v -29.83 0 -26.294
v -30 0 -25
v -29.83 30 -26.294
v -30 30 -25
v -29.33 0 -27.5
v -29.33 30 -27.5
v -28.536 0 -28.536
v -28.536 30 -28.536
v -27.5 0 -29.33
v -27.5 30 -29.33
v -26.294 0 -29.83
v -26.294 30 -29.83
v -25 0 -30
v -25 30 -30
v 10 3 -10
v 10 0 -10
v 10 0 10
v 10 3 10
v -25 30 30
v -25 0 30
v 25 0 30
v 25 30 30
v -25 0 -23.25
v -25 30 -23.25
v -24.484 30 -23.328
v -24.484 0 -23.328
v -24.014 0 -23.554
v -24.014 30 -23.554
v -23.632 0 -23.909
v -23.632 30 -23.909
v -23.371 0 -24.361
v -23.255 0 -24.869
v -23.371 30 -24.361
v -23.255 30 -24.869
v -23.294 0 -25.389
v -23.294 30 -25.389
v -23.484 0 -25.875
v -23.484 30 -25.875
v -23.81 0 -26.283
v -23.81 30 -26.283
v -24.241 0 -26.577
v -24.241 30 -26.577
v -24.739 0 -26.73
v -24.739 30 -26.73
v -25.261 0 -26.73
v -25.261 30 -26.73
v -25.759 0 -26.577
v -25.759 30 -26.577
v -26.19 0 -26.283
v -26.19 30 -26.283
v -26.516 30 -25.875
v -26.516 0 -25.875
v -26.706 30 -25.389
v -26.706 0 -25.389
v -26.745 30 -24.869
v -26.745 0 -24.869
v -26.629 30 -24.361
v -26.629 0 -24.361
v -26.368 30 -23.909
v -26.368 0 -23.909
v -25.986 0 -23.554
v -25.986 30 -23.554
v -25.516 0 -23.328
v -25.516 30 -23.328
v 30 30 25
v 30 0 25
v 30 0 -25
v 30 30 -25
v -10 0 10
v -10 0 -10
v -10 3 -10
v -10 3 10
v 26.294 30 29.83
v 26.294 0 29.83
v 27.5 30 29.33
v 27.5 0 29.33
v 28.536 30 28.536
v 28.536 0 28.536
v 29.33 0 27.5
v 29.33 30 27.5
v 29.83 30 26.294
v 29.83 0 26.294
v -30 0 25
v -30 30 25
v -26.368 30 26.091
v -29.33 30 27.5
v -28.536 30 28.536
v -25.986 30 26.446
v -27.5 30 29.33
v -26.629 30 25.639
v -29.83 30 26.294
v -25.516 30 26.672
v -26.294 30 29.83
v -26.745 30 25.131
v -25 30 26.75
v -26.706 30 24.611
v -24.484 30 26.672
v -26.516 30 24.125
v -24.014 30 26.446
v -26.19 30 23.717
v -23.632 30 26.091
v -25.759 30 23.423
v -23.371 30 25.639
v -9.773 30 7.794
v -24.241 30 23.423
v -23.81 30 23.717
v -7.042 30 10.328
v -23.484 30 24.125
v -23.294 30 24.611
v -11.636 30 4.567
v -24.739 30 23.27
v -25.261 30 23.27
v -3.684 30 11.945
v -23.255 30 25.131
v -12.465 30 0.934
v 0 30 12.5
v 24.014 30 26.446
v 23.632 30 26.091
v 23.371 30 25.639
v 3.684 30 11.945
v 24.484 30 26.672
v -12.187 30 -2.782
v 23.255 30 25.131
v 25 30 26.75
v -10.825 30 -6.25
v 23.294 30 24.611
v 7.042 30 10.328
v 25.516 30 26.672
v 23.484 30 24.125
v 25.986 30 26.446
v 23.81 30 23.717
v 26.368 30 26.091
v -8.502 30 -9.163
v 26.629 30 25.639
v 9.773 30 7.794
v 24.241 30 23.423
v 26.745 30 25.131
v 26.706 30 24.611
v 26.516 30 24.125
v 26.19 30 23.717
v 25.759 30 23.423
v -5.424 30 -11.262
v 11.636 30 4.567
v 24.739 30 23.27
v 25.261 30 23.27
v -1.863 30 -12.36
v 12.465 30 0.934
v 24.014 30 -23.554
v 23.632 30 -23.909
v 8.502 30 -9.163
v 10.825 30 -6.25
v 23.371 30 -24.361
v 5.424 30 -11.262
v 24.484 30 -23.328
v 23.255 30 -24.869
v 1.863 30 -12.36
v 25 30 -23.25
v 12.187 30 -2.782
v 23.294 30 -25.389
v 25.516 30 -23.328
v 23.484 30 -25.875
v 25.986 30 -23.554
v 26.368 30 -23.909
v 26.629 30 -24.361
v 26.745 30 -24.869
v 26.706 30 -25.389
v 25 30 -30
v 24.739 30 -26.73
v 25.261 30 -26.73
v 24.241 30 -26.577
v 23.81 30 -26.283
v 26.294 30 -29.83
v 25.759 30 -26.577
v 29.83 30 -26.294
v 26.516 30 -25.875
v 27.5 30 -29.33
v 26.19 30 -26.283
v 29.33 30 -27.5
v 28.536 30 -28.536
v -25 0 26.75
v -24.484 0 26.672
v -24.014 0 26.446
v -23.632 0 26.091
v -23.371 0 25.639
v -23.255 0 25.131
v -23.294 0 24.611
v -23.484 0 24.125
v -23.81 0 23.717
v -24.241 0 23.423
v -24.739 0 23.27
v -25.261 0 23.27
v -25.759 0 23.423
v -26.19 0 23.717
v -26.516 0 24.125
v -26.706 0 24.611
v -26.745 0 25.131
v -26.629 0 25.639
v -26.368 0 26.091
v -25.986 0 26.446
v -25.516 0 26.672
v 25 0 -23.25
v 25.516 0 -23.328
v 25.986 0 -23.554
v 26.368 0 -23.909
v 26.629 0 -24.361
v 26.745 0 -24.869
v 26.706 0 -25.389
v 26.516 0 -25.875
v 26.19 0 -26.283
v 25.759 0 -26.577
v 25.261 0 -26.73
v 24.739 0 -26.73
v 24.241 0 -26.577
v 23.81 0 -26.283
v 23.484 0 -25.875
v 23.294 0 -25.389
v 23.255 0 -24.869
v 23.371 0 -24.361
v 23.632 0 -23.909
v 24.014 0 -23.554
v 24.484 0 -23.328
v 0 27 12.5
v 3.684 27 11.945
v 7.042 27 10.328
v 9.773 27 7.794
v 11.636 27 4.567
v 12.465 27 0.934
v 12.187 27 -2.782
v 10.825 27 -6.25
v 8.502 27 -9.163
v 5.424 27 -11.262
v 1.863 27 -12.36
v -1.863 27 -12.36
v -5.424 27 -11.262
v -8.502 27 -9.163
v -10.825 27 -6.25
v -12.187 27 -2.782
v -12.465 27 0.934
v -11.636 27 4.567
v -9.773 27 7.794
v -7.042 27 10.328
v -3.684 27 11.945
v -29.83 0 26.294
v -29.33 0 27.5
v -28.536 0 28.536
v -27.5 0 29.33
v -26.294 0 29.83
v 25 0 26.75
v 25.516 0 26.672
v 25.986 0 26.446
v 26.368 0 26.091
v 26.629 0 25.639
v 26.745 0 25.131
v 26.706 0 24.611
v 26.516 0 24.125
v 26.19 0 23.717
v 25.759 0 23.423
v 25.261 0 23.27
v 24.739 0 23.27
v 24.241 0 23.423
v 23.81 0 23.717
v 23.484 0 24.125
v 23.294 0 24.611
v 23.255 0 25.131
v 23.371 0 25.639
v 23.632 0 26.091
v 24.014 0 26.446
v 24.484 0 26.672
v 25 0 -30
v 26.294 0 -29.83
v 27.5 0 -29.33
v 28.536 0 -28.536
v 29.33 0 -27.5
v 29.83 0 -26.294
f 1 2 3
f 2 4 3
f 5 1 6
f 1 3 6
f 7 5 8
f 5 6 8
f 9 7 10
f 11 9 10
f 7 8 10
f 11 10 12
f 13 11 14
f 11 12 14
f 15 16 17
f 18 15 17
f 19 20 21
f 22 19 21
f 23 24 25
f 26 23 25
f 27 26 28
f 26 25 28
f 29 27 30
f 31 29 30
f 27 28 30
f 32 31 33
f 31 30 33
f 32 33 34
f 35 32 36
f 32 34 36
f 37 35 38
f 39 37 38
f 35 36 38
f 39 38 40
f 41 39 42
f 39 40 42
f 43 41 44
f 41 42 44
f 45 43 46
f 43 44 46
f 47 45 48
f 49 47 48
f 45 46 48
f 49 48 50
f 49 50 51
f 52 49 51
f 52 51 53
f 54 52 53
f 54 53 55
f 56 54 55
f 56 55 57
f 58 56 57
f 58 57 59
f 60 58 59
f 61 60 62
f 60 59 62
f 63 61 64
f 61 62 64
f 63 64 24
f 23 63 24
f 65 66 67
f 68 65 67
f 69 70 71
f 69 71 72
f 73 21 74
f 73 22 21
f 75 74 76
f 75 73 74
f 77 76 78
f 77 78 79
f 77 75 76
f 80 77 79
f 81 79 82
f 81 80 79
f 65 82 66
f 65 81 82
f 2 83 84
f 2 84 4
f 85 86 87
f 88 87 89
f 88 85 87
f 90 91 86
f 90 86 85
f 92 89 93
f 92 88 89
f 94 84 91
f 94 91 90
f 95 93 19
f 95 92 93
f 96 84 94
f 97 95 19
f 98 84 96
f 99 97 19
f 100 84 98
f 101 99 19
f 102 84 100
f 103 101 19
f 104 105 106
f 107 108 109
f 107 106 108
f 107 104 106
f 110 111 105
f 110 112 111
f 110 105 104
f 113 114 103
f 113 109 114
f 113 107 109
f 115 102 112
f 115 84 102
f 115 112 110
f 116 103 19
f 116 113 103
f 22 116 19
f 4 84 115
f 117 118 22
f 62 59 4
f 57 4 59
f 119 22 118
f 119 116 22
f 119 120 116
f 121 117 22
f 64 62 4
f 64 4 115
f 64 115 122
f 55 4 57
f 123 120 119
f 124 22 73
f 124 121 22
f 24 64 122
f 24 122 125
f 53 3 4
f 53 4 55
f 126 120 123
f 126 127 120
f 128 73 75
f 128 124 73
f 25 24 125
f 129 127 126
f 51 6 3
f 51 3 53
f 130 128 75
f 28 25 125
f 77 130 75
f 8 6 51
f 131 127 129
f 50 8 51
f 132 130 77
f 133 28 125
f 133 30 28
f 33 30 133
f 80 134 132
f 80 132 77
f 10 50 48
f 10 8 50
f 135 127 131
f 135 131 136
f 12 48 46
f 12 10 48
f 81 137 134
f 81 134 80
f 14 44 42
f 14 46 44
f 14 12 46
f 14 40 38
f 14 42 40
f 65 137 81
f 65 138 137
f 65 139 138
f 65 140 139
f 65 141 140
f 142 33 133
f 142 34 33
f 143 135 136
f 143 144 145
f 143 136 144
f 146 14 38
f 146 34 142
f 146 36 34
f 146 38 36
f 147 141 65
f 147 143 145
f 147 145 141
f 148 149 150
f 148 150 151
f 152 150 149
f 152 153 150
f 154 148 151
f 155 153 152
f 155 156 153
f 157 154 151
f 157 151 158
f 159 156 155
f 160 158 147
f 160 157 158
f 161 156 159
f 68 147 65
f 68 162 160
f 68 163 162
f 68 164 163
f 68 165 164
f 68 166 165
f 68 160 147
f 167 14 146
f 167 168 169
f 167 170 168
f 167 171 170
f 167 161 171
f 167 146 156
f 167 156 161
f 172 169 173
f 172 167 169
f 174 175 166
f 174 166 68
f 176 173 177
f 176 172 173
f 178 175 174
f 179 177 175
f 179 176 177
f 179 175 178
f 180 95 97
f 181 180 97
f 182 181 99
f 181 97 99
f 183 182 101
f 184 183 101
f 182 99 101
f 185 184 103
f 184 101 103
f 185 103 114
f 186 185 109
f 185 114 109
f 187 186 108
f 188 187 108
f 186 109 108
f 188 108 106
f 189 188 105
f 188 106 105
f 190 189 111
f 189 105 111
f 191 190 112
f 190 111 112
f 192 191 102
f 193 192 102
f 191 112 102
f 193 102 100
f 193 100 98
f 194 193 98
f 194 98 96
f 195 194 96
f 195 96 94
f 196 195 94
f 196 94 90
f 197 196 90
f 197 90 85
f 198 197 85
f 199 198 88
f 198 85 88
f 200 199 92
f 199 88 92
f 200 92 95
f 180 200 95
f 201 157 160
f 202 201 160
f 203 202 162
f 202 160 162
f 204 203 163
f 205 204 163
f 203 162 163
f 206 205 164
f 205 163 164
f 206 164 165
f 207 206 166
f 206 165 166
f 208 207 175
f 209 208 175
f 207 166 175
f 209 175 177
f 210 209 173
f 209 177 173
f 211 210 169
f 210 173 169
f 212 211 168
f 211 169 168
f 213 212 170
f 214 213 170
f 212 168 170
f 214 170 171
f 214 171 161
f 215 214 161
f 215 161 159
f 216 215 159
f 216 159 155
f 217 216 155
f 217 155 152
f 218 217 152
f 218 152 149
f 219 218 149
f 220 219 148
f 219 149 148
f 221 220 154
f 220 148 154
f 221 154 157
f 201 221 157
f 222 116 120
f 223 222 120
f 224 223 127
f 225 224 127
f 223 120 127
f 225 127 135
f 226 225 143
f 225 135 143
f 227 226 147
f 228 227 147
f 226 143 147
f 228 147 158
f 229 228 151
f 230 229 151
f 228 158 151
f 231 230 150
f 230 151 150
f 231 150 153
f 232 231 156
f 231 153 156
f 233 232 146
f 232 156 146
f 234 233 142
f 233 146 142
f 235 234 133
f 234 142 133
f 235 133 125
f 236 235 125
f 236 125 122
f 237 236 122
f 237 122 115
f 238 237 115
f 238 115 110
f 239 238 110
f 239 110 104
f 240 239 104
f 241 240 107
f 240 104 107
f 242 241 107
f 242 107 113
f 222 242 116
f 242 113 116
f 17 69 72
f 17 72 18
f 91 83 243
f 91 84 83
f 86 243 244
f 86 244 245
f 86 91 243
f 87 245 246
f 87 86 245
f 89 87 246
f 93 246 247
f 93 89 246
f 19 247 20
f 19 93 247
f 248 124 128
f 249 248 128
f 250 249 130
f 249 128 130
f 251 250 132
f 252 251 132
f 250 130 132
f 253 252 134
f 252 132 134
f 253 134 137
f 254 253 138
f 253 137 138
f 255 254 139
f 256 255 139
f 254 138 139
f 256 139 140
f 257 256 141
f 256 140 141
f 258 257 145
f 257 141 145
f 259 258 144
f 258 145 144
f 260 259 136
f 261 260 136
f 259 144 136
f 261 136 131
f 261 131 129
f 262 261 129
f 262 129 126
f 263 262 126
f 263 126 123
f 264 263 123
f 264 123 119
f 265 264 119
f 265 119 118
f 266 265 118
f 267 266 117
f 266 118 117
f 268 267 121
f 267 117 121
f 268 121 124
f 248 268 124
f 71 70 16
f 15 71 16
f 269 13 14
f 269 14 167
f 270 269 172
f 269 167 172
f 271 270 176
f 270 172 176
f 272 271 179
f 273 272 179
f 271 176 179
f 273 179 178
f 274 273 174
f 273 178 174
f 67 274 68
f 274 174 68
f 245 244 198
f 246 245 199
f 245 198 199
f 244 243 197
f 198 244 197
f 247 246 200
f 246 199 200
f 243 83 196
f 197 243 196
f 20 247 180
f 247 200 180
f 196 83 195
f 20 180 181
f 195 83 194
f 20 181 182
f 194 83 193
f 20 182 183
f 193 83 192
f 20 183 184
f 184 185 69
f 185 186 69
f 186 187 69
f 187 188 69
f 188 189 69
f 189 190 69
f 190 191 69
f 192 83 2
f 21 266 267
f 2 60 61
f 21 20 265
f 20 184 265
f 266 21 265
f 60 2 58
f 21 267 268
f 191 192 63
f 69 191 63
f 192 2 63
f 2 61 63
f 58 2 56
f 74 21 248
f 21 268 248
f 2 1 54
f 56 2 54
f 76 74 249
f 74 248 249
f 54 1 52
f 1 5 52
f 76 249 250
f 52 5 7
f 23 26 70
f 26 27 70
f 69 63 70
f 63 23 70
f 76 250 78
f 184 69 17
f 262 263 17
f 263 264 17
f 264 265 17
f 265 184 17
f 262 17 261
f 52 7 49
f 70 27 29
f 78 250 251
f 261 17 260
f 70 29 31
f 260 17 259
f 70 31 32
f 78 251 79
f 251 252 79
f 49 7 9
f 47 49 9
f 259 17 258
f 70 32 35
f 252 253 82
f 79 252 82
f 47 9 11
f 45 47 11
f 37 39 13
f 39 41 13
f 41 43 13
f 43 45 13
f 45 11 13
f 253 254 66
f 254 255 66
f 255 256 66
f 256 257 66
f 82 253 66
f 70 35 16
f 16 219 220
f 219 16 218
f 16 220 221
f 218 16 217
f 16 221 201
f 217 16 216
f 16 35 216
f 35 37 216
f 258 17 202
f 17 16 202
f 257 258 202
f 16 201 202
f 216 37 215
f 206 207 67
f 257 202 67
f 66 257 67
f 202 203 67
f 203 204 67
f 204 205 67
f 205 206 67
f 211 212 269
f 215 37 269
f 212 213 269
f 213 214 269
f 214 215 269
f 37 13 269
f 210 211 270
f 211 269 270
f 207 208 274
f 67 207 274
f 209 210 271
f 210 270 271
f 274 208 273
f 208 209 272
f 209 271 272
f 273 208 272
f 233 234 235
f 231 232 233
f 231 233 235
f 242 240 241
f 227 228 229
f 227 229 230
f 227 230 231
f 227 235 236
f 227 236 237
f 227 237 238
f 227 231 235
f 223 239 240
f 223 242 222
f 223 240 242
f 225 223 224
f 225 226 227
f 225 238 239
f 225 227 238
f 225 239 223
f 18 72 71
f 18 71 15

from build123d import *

# Parameters (mm, degrees)
SKETCH_1_W          = 60
SKETCH_1_H          = 60
EXTRUDE_1_DEPTH     = 30
SKETCH_2_R          = 1.75
CUT_EXTRUDE_1_DEPTH = 30
SKETCH_3_R          = 12.5
CUT_EXTRUDE_2_DEPTH = 3
SKETCH_4_W          = 20
SKETCH_4_H          = 20
CUT_EXTRUDE_3_DEPTH = 3
FILLET_1_R          = 5


with BuildPart() as part:
    # 草图1 → 凸台-拉伸1 (new body)
    with BuildSketch(Plane(origin=(0, 0, 0), x_dir=(1, 0, 0), z_dir=(0, 1, 0))):
        Rectangle(SKETCH_1_W, SKETCH_1_H)
    extrude(amount=EXTRUDE_1_DEPTH)

    # 草图2 → 切除-拉伸1 (cut)
    with BuildSketch(Plane(origin=(0, 30, 0), x_dir=(1, 0, 0), z_dir=(0, 1, 0))):
        with Locations(Location((25, 25, 0), (0, 0, 270))):
            Circle(SKETCH_2_R)
        with Locations(Location((-25, 25, 0), (0, 0, 270))):
            Circle(SKETCH_2_R)
        with Locations(Location((-25, -25, 0), (0, 0, 270))):
            Circle(SKETCH_2_R)
        with Locations(Location((25, -25, 0), (0, 0, 270))):
            Circle(SKETCH_2_R)
    extrude(amount=-CUT_EXTRUDE_1_DEPTH, mode=Mode.SUBTRACT)

    # 草图3 → 切除-拉伸2 (cut)
    with BuildSketch(Plane(origin=(0, 30, 0), x_dir=(1, 0, 0), z_dir=(0, 1, 0))):
        with Locations(Location((0, 0, 0), (0, 0, 270))):
            Circle(SKETCH_3_R)
    extrude(amount=-CUT_EXTRUDE_2_DEPTH, mode=Mode.SUBTRACT)

    # 草图4 → 切除-拉伸3 (cut)
    with BuildSketch(Plane.XZ):
        Rectangle(SKETCH_4_W, SKETCH_4_H)
    extrude(amount=-CUT_EXTRUDE_3_DEPTH, mode=Mode.SUBTRACT)

    # 圆角1
    fillet_1_edges = [part.edges().sort_by_distance(p)[0] for p in [
        (30, 15, 30),
        (-30, 15, 30),
        (-30, 15, -30),
        (30, 15, -30),
    ]]
    fillet(fillet_1_edges, radius=FILLET_1_R)


solid = part.part
